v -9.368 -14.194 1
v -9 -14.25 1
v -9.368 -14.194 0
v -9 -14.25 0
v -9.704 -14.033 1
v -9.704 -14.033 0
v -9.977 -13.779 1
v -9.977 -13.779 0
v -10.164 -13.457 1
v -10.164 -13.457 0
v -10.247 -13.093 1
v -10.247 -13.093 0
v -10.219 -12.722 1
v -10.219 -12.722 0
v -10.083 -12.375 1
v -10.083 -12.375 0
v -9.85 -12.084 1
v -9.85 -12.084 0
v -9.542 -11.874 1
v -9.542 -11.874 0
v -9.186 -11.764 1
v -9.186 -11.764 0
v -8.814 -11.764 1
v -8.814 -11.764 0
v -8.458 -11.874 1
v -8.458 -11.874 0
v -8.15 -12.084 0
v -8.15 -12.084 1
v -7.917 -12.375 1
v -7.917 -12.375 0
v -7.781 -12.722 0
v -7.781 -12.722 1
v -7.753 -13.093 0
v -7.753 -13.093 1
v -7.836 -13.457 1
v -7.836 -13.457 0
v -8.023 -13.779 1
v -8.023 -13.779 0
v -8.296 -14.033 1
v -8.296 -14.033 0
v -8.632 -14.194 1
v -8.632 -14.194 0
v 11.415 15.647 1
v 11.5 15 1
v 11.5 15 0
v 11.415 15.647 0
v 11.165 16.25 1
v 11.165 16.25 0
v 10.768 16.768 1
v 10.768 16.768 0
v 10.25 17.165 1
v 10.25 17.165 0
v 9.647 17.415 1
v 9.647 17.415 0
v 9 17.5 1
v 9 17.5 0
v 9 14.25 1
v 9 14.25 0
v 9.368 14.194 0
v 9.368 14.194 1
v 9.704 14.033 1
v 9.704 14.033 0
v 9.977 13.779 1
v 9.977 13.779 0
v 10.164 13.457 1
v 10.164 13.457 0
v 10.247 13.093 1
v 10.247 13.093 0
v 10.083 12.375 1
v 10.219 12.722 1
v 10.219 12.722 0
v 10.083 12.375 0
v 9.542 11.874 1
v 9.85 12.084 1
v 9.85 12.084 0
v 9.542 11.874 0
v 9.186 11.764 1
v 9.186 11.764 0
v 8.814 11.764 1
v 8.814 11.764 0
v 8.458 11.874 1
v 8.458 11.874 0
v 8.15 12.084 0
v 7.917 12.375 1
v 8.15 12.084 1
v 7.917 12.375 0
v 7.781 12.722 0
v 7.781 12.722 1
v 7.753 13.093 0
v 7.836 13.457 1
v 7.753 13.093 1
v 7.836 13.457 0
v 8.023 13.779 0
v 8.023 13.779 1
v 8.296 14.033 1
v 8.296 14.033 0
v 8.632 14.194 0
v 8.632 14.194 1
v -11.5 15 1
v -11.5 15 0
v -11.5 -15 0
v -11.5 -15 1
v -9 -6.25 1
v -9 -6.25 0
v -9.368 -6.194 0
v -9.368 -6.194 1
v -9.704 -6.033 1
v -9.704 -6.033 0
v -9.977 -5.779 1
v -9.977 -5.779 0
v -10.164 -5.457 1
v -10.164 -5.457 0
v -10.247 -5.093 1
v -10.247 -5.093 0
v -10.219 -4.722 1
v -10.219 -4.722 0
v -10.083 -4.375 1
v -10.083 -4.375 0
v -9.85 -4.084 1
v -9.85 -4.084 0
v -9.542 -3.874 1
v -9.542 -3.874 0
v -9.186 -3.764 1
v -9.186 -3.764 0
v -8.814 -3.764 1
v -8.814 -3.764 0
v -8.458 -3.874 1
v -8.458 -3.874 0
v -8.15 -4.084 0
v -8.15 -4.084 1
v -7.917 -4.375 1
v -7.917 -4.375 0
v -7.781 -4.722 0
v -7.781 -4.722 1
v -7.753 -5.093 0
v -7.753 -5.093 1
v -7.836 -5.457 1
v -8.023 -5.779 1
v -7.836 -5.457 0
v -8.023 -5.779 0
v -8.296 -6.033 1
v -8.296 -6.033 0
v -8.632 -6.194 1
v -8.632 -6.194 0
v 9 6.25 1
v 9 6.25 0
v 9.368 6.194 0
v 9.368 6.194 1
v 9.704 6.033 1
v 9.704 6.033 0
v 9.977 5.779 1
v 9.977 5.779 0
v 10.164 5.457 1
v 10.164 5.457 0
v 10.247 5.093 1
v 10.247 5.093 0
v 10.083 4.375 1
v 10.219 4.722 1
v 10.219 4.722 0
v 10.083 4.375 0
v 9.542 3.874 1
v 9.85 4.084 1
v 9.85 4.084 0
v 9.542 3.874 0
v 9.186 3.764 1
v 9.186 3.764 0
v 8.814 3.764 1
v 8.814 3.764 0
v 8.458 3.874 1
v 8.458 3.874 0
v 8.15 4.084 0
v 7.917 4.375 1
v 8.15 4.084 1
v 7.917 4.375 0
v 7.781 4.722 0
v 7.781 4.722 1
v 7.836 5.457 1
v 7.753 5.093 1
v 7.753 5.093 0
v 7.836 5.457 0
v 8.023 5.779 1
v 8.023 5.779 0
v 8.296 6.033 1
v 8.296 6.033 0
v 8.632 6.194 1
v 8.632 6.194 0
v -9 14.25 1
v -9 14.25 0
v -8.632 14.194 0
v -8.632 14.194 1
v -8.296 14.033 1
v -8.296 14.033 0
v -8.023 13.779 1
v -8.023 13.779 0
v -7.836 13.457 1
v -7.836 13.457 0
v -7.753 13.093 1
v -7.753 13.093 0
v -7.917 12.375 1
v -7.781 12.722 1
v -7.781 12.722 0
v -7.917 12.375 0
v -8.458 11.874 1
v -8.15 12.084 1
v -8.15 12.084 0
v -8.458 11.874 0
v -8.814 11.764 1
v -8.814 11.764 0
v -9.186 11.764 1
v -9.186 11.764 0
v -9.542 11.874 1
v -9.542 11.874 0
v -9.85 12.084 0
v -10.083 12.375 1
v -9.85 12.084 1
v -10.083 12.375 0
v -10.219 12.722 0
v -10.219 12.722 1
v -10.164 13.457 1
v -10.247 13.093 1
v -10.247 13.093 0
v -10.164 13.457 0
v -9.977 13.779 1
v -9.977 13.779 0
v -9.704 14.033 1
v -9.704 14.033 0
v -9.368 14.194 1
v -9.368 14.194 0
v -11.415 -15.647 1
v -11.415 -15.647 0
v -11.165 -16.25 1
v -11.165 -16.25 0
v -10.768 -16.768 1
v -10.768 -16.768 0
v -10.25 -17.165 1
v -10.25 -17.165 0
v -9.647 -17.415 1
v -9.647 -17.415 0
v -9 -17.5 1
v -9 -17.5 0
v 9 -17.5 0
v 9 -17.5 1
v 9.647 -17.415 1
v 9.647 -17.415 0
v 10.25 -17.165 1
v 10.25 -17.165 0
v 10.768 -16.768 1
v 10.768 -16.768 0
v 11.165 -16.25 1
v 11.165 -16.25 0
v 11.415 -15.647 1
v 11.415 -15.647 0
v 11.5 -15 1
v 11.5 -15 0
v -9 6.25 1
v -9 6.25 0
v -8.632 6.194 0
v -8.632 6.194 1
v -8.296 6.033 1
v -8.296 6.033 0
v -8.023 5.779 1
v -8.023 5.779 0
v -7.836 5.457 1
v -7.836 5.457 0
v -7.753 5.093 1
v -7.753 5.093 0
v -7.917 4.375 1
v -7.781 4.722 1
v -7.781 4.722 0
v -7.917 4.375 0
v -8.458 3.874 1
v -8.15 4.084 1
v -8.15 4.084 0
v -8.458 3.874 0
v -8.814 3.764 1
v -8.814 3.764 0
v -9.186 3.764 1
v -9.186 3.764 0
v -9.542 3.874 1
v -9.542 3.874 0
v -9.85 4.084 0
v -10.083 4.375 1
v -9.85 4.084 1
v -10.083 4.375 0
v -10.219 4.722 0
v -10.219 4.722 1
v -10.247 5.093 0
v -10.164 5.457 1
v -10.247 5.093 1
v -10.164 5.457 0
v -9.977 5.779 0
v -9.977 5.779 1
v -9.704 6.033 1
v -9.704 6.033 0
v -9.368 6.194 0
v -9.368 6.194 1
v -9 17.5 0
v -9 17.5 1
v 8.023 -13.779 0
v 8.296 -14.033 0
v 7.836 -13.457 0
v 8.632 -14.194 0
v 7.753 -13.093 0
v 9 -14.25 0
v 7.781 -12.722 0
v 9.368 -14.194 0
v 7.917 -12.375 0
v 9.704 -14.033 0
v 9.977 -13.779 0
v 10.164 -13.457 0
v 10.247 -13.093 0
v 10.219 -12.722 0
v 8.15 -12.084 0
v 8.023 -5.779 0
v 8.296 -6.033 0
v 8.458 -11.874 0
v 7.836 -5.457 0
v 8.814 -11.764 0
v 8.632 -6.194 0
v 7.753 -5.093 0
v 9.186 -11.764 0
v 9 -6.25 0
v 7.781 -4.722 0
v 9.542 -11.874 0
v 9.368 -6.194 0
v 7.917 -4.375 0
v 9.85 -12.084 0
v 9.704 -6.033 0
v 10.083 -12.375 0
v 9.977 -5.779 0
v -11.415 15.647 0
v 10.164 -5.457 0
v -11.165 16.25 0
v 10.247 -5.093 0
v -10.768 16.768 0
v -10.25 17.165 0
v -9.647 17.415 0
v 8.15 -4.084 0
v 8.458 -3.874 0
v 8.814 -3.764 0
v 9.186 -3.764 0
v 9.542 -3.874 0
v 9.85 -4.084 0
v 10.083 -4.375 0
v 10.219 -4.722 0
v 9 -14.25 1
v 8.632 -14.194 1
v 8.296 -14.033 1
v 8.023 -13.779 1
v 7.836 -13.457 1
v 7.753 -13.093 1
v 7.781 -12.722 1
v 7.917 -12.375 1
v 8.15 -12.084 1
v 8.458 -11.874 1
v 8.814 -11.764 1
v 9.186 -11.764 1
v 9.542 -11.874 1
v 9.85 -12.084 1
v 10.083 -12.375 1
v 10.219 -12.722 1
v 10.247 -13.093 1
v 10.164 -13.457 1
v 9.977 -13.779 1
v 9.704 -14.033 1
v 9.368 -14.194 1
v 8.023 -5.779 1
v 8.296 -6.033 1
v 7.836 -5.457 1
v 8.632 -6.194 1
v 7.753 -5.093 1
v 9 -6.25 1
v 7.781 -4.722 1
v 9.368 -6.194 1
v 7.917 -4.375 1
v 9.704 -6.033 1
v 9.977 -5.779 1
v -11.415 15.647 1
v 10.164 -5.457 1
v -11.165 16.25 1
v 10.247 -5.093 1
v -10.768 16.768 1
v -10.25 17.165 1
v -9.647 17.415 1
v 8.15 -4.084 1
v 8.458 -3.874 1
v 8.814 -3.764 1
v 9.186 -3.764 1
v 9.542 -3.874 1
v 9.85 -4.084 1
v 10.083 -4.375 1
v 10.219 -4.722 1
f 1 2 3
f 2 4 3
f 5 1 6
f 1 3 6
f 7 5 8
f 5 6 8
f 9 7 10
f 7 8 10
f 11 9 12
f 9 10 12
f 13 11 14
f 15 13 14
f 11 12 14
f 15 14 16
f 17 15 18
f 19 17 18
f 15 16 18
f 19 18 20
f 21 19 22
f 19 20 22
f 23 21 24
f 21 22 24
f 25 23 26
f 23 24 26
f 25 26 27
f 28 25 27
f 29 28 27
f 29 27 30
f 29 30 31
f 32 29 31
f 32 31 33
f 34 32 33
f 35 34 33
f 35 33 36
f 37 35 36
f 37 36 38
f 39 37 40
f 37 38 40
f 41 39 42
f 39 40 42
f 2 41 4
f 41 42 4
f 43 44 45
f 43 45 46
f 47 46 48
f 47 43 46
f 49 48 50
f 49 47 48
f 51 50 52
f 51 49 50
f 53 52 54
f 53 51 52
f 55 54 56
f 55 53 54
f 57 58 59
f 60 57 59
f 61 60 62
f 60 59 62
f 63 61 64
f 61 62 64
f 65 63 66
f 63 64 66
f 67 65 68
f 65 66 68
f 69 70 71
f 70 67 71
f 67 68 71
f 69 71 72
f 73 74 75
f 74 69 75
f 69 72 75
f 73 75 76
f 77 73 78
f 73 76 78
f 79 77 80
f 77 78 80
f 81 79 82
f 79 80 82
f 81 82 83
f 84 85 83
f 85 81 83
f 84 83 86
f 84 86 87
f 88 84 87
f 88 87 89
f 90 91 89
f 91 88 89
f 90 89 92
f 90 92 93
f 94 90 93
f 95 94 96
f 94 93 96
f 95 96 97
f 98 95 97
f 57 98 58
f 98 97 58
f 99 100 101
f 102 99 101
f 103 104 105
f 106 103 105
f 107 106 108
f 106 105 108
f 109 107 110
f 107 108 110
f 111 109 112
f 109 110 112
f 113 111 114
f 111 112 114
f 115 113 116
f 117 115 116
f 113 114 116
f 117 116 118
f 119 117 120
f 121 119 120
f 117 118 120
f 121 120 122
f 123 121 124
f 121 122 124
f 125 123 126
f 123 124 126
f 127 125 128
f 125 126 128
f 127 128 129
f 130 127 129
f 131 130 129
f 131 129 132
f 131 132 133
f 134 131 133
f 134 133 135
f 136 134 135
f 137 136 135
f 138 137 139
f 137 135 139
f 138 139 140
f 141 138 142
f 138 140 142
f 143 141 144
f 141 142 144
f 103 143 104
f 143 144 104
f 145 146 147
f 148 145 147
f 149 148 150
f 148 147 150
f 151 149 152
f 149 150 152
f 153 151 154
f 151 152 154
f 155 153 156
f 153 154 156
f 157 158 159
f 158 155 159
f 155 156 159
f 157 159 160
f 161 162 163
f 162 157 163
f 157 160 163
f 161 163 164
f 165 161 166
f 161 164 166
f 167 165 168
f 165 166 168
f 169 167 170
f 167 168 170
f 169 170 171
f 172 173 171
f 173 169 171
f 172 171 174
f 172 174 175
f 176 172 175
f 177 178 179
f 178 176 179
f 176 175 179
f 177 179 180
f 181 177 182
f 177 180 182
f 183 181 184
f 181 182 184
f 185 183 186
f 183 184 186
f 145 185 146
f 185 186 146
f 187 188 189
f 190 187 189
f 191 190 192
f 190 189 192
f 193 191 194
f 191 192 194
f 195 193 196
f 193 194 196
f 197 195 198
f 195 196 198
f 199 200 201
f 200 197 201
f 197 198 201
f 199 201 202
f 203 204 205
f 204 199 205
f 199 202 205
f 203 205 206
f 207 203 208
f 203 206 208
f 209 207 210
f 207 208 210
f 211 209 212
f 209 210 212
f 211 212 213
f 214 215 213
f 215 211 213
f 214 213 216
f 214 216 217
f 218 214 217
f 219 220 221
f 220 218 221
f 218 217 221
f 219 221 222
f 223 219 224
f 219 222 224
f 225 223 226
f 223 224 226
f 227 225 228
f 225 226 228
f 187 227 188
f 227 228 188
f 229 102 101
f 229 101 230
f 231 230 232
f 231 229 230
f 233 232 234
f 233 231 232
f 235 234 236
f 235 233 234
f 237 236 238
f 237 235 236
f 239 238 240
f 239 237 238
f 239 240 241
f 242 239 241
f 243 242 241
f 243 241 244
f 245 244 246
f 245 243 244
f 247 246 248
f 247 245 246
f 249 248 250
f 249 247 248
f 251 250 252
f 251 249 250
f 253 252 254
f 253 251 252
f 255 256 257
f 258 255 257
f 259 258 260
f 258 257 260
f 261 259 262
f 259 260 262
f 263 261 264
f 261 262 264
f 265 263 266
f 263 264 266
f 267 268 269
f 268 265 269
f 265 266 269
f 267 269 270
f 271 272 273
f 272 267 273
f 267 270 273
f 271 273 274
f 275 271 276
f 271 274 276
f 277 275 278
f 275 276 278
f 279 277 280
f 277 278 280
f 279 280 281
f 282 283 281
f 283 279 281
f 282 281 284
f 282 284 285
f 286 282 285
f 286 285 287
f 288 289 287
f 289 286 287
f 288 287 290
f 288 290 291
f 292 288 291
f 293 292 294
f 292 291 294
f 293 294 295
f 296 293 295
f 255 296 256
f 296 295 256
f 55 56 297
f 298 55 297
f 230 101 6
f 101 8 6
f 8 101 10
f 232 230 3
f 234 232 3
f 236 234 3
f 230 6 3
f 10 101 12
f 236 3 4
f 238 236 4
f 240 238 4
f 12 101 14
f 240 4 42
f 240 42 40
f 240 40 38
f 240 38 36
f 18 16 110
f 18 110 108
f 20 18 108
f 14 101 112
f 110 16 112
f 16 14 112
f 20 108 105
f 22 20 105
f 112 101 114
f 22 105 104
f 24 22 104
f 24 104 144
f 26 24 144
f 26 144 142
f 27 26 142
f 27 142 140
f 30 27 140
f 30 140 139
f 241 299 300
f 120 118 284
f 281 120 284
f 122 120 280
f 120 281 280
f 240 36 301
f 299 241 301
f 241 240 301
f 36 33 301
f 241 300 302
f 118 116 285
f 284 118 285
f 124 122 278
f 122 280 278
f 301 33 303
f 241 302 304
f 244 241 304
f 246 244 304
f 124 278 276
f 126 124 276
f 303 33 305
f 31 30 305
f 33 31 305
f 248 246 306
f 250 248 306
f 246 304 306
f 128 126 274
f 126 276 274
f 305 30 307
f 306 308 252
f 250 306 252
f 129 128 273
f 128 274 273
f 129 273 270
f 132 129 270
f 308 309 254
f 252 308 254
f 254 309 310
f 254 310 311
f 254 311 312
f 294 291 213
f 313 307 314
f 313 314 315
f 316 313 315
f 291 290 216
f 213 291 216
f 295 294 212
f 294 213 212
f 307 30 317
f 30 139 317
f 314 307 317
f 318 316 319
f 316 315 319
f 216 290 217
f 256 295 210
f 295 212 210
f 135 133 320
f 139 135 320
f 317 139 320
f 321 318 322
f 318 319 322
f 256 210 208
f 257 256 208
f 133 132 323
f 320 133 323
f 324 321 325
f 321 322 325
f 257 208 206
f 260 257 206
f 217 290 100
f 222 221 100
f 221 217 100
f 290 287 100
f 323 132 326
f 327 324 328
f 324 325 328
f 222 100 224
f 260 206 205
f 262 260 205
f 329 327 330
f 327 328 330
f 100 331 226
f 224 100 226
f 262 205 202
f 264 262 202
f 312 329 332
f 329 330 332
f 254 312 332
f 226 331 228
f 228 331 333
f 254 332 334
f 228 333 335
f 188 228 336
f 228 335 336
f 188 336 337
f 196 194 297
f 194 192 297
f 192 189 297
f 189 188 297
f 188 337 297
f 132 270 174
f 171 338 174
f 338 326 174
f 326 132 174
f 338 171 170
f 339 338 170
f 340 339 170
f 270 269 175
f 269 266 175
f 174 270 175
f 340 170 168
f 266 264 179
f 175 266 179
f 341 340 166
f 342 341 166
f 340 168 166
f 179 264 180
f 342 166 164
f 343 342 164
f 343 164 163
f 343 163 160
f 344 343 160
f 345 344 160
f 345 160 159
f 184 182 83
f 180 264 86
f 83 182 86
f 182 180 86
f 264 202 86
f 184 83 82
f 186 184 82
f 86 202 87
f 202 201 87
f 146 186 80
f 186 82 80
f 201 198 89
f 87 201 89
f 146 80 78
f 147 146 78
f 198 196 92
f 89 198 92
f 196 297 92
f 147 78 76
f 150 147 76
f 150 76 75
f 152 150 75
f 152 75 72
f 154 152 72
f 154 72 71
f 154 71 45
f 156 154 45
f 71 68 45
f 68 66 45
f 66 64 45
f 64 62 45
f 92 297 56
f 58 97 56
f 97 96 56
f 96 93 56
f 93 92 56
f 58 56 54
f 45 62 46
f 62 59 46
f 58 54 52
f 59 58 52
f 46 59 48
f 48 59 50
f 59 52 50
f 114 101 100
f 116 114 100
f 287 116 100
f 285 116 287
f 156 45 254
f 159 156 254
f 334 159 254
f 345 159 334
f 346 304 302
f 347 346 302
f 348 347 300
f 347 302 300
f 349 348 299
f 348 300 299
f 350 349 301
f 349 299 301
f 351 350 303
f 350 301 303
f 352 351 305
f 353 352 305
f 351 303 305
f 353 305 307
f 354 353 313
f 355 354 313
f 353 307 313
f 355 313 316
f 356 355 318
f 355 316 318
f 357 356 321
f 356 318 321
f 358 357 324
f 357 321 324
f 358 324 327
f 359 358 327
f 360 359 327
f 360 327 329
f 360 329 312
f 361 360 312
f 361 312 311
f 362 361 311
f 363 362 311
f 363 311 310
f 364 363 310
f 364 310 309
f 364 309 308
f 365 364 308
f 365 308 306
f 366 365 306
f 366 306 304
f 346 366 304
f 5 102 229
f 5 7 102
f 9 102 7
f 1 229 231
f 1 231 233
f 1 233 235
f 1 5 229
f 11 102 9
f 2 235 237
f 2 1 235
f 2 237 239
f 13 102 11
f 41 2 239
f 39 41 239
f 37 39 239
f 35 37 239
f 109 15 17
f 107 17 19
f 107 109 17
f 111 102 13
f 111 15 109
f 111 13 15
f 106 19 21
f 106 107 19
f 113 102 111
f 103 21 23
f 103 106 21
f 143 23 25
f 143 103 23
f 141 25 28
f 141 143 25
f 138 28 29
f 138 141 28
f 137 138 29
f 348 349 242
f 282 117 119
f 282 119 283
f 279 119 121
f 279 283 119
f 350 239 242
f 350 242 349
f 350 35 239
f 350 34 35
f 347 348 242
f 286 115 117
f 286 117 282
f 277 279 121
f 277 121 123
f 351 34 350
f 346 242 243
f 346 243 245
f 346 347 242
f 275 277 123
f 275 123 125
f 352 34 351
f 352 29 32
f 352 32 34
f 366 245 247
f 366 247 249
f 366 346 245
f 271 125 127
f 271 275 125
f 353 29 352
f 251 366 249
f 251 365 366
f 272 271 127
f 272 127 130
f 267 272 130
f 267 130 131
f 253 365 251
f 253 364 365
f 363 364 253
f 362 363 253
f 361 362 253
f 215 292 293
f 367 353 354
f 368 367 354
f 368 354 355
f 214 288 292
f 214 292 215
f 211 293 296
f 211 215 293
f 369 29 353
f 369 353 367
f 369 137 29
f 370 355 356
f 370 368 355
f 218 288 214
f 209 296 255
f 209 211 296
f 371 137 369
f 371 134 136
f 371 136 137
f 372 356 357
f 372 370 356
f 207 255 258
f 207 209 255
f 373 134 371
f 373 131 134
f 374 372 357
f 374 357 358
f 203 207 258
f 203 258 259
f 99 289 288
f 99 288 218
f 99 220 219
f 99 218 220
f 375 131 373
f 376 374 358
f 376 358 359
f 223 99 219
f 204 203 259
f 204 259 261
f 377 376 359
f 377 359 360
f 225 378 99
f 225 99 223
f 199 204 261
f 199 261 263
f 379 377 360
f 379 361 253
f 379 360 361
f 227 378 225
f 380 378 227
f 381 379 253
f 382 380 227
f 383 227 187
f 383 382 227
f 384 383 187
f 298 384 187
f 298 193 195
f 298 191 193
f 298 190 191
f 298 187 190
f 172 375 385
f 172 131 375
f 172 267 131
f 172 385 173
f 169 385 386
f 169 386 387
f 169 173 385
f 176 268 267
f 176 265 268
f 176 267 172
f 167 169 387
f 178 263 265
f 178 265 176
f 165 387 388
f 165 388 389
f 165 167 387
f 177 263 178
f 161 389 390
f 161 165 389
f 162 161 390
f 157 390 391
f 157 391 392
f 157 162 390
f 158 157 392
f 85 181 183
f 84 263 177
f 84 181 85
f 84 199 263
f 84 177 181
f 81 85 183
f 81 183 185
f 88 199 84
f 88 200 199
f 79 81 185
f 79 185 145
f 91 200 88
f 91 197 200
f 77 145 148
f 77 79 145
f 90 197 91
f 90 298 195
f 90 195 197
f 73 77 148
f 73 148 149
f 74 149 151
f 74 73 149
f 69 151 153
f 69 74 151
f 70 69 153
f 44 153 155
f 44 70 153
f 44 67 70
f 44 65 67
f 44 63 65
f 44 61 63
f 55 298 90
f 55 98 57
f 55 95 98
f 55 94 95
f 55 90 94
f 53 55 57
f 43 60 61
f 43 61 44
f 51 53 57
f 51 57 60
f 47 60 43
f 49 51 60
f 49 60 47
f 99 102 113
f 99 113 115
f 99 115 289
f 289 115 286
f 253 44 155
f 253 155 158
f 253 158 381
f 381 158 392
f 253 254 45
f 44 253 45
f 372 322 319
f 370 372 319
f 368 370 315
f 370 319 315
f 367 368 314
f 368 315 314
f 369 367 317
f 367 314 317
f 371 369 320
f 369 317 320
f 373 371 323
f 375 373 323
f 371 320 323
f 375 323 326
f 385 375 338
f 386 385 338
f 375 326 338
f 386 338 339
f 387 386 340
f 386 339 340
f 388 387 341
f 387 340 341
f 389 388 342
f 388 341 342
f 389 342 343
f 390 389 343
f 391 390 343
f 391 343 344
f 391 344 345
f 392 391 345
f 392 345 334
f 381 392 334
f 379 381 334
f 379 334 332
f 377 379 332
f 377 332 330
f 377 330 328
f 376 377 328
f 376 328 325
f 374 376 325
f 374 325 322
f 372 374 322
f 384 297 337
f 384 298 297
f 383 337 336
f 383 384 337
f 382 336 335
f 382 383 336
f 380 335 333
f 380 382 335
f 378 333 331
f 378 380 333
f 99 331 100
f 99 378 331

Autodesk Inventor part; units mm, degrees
ref_plane "YZ Plane" through (0, 0, 0) normal (1, 0, 0) x (0, 1, 0)
ref_plane "XZ Plane" through (0, 0, 0) normal (0, 1, 0) x (-1, 0, 0)
ref_plane "XY Plane" through (0, 0, 0) normal (0, 0, 1) x (1, 0, 0)
sketch "Sketch1" plane through (0, 0, 0) normal (0, 0, 1) x (1, 0, 0)
  line L0 (-11.5, -17.5) -> (11.5, -17.5)
  line L1 (11.5, -17.5) -> (11.5, 17.5)
  line L2 (11.5, 17.5) -> (-11.5, 17.5)
  line L3 (-11.5, 17.5) -> (-11.5, -17.5)
  line L4 (-11.5, -17.5) -> (11.5, 17.5) construction
  line L5 (11.5, -17.5) -> (-11.5, 17.5) construction
  point P0 (0, 0)
  dimension "d0" = 23
  dimension "d1" = 35
extrude "Plate1" add sketch "Sketch1" along normal blind 1
sketch "Sketch2" plane through (0, 0, 1) normal (0, 0, 1) x (1, 0, 0)
  line L0 (-11.5, -17.5) -> (-11.5, 17.5) projected
  point P0 (0, 0)
  point P1 (-9, -13)
  point P2 (9, -13)
  point P3 (-9, -5)
  point P4 (9, -5)
  dimension "d3" = 18
  dimension "d4" = 9
  dimension "d5" = 8
  dimension "d8" = 2.5
  dimension "d17" = 5
hole "Hole1" at (-9, -13, 1) at (9, -13, 1) at (-9, -5, 1) at (9, -5, 1) direction (0, 0, -1) diameter 2.5 depth 1
fillet "Fillet1" radius 2.5 4 edges at (11.5, 17.5, 0.5) (11.5, -17.5, 0.5) (-11.5, -17.5, 0.5) (-11.5, 17.5, 0.5)
mirror "Mirror1" about plane through (0, 0, 0) normal (0, 1, 0) of "Hole1"
equation "\"d4\" = 0.5 * d3"
equation "\"d14\" = Stärke"
equation "\"d2\" = Stärke"
equation "\"Biegeradius\" = Stärke"
equation "\"BreiteBiegungsfreistellung\" = Stärke"
equation "\"TiefeBiegungsfreistellung\" = 0.5 * Stärke"
equation "\"GrößeEckenfreistellung\" = 4 * Stärke"
equation "\"MinimalRest\" = 2 * Stärke"
equation "\"Übergangsradius\" = Biegeradius"
equation "\"JacobiRadiusGröße\" = Biegeradius"
equation "\"Abstandsgröße\" = Stärke"
equation "\"Stärke\" = 1"
properties part number "17"
